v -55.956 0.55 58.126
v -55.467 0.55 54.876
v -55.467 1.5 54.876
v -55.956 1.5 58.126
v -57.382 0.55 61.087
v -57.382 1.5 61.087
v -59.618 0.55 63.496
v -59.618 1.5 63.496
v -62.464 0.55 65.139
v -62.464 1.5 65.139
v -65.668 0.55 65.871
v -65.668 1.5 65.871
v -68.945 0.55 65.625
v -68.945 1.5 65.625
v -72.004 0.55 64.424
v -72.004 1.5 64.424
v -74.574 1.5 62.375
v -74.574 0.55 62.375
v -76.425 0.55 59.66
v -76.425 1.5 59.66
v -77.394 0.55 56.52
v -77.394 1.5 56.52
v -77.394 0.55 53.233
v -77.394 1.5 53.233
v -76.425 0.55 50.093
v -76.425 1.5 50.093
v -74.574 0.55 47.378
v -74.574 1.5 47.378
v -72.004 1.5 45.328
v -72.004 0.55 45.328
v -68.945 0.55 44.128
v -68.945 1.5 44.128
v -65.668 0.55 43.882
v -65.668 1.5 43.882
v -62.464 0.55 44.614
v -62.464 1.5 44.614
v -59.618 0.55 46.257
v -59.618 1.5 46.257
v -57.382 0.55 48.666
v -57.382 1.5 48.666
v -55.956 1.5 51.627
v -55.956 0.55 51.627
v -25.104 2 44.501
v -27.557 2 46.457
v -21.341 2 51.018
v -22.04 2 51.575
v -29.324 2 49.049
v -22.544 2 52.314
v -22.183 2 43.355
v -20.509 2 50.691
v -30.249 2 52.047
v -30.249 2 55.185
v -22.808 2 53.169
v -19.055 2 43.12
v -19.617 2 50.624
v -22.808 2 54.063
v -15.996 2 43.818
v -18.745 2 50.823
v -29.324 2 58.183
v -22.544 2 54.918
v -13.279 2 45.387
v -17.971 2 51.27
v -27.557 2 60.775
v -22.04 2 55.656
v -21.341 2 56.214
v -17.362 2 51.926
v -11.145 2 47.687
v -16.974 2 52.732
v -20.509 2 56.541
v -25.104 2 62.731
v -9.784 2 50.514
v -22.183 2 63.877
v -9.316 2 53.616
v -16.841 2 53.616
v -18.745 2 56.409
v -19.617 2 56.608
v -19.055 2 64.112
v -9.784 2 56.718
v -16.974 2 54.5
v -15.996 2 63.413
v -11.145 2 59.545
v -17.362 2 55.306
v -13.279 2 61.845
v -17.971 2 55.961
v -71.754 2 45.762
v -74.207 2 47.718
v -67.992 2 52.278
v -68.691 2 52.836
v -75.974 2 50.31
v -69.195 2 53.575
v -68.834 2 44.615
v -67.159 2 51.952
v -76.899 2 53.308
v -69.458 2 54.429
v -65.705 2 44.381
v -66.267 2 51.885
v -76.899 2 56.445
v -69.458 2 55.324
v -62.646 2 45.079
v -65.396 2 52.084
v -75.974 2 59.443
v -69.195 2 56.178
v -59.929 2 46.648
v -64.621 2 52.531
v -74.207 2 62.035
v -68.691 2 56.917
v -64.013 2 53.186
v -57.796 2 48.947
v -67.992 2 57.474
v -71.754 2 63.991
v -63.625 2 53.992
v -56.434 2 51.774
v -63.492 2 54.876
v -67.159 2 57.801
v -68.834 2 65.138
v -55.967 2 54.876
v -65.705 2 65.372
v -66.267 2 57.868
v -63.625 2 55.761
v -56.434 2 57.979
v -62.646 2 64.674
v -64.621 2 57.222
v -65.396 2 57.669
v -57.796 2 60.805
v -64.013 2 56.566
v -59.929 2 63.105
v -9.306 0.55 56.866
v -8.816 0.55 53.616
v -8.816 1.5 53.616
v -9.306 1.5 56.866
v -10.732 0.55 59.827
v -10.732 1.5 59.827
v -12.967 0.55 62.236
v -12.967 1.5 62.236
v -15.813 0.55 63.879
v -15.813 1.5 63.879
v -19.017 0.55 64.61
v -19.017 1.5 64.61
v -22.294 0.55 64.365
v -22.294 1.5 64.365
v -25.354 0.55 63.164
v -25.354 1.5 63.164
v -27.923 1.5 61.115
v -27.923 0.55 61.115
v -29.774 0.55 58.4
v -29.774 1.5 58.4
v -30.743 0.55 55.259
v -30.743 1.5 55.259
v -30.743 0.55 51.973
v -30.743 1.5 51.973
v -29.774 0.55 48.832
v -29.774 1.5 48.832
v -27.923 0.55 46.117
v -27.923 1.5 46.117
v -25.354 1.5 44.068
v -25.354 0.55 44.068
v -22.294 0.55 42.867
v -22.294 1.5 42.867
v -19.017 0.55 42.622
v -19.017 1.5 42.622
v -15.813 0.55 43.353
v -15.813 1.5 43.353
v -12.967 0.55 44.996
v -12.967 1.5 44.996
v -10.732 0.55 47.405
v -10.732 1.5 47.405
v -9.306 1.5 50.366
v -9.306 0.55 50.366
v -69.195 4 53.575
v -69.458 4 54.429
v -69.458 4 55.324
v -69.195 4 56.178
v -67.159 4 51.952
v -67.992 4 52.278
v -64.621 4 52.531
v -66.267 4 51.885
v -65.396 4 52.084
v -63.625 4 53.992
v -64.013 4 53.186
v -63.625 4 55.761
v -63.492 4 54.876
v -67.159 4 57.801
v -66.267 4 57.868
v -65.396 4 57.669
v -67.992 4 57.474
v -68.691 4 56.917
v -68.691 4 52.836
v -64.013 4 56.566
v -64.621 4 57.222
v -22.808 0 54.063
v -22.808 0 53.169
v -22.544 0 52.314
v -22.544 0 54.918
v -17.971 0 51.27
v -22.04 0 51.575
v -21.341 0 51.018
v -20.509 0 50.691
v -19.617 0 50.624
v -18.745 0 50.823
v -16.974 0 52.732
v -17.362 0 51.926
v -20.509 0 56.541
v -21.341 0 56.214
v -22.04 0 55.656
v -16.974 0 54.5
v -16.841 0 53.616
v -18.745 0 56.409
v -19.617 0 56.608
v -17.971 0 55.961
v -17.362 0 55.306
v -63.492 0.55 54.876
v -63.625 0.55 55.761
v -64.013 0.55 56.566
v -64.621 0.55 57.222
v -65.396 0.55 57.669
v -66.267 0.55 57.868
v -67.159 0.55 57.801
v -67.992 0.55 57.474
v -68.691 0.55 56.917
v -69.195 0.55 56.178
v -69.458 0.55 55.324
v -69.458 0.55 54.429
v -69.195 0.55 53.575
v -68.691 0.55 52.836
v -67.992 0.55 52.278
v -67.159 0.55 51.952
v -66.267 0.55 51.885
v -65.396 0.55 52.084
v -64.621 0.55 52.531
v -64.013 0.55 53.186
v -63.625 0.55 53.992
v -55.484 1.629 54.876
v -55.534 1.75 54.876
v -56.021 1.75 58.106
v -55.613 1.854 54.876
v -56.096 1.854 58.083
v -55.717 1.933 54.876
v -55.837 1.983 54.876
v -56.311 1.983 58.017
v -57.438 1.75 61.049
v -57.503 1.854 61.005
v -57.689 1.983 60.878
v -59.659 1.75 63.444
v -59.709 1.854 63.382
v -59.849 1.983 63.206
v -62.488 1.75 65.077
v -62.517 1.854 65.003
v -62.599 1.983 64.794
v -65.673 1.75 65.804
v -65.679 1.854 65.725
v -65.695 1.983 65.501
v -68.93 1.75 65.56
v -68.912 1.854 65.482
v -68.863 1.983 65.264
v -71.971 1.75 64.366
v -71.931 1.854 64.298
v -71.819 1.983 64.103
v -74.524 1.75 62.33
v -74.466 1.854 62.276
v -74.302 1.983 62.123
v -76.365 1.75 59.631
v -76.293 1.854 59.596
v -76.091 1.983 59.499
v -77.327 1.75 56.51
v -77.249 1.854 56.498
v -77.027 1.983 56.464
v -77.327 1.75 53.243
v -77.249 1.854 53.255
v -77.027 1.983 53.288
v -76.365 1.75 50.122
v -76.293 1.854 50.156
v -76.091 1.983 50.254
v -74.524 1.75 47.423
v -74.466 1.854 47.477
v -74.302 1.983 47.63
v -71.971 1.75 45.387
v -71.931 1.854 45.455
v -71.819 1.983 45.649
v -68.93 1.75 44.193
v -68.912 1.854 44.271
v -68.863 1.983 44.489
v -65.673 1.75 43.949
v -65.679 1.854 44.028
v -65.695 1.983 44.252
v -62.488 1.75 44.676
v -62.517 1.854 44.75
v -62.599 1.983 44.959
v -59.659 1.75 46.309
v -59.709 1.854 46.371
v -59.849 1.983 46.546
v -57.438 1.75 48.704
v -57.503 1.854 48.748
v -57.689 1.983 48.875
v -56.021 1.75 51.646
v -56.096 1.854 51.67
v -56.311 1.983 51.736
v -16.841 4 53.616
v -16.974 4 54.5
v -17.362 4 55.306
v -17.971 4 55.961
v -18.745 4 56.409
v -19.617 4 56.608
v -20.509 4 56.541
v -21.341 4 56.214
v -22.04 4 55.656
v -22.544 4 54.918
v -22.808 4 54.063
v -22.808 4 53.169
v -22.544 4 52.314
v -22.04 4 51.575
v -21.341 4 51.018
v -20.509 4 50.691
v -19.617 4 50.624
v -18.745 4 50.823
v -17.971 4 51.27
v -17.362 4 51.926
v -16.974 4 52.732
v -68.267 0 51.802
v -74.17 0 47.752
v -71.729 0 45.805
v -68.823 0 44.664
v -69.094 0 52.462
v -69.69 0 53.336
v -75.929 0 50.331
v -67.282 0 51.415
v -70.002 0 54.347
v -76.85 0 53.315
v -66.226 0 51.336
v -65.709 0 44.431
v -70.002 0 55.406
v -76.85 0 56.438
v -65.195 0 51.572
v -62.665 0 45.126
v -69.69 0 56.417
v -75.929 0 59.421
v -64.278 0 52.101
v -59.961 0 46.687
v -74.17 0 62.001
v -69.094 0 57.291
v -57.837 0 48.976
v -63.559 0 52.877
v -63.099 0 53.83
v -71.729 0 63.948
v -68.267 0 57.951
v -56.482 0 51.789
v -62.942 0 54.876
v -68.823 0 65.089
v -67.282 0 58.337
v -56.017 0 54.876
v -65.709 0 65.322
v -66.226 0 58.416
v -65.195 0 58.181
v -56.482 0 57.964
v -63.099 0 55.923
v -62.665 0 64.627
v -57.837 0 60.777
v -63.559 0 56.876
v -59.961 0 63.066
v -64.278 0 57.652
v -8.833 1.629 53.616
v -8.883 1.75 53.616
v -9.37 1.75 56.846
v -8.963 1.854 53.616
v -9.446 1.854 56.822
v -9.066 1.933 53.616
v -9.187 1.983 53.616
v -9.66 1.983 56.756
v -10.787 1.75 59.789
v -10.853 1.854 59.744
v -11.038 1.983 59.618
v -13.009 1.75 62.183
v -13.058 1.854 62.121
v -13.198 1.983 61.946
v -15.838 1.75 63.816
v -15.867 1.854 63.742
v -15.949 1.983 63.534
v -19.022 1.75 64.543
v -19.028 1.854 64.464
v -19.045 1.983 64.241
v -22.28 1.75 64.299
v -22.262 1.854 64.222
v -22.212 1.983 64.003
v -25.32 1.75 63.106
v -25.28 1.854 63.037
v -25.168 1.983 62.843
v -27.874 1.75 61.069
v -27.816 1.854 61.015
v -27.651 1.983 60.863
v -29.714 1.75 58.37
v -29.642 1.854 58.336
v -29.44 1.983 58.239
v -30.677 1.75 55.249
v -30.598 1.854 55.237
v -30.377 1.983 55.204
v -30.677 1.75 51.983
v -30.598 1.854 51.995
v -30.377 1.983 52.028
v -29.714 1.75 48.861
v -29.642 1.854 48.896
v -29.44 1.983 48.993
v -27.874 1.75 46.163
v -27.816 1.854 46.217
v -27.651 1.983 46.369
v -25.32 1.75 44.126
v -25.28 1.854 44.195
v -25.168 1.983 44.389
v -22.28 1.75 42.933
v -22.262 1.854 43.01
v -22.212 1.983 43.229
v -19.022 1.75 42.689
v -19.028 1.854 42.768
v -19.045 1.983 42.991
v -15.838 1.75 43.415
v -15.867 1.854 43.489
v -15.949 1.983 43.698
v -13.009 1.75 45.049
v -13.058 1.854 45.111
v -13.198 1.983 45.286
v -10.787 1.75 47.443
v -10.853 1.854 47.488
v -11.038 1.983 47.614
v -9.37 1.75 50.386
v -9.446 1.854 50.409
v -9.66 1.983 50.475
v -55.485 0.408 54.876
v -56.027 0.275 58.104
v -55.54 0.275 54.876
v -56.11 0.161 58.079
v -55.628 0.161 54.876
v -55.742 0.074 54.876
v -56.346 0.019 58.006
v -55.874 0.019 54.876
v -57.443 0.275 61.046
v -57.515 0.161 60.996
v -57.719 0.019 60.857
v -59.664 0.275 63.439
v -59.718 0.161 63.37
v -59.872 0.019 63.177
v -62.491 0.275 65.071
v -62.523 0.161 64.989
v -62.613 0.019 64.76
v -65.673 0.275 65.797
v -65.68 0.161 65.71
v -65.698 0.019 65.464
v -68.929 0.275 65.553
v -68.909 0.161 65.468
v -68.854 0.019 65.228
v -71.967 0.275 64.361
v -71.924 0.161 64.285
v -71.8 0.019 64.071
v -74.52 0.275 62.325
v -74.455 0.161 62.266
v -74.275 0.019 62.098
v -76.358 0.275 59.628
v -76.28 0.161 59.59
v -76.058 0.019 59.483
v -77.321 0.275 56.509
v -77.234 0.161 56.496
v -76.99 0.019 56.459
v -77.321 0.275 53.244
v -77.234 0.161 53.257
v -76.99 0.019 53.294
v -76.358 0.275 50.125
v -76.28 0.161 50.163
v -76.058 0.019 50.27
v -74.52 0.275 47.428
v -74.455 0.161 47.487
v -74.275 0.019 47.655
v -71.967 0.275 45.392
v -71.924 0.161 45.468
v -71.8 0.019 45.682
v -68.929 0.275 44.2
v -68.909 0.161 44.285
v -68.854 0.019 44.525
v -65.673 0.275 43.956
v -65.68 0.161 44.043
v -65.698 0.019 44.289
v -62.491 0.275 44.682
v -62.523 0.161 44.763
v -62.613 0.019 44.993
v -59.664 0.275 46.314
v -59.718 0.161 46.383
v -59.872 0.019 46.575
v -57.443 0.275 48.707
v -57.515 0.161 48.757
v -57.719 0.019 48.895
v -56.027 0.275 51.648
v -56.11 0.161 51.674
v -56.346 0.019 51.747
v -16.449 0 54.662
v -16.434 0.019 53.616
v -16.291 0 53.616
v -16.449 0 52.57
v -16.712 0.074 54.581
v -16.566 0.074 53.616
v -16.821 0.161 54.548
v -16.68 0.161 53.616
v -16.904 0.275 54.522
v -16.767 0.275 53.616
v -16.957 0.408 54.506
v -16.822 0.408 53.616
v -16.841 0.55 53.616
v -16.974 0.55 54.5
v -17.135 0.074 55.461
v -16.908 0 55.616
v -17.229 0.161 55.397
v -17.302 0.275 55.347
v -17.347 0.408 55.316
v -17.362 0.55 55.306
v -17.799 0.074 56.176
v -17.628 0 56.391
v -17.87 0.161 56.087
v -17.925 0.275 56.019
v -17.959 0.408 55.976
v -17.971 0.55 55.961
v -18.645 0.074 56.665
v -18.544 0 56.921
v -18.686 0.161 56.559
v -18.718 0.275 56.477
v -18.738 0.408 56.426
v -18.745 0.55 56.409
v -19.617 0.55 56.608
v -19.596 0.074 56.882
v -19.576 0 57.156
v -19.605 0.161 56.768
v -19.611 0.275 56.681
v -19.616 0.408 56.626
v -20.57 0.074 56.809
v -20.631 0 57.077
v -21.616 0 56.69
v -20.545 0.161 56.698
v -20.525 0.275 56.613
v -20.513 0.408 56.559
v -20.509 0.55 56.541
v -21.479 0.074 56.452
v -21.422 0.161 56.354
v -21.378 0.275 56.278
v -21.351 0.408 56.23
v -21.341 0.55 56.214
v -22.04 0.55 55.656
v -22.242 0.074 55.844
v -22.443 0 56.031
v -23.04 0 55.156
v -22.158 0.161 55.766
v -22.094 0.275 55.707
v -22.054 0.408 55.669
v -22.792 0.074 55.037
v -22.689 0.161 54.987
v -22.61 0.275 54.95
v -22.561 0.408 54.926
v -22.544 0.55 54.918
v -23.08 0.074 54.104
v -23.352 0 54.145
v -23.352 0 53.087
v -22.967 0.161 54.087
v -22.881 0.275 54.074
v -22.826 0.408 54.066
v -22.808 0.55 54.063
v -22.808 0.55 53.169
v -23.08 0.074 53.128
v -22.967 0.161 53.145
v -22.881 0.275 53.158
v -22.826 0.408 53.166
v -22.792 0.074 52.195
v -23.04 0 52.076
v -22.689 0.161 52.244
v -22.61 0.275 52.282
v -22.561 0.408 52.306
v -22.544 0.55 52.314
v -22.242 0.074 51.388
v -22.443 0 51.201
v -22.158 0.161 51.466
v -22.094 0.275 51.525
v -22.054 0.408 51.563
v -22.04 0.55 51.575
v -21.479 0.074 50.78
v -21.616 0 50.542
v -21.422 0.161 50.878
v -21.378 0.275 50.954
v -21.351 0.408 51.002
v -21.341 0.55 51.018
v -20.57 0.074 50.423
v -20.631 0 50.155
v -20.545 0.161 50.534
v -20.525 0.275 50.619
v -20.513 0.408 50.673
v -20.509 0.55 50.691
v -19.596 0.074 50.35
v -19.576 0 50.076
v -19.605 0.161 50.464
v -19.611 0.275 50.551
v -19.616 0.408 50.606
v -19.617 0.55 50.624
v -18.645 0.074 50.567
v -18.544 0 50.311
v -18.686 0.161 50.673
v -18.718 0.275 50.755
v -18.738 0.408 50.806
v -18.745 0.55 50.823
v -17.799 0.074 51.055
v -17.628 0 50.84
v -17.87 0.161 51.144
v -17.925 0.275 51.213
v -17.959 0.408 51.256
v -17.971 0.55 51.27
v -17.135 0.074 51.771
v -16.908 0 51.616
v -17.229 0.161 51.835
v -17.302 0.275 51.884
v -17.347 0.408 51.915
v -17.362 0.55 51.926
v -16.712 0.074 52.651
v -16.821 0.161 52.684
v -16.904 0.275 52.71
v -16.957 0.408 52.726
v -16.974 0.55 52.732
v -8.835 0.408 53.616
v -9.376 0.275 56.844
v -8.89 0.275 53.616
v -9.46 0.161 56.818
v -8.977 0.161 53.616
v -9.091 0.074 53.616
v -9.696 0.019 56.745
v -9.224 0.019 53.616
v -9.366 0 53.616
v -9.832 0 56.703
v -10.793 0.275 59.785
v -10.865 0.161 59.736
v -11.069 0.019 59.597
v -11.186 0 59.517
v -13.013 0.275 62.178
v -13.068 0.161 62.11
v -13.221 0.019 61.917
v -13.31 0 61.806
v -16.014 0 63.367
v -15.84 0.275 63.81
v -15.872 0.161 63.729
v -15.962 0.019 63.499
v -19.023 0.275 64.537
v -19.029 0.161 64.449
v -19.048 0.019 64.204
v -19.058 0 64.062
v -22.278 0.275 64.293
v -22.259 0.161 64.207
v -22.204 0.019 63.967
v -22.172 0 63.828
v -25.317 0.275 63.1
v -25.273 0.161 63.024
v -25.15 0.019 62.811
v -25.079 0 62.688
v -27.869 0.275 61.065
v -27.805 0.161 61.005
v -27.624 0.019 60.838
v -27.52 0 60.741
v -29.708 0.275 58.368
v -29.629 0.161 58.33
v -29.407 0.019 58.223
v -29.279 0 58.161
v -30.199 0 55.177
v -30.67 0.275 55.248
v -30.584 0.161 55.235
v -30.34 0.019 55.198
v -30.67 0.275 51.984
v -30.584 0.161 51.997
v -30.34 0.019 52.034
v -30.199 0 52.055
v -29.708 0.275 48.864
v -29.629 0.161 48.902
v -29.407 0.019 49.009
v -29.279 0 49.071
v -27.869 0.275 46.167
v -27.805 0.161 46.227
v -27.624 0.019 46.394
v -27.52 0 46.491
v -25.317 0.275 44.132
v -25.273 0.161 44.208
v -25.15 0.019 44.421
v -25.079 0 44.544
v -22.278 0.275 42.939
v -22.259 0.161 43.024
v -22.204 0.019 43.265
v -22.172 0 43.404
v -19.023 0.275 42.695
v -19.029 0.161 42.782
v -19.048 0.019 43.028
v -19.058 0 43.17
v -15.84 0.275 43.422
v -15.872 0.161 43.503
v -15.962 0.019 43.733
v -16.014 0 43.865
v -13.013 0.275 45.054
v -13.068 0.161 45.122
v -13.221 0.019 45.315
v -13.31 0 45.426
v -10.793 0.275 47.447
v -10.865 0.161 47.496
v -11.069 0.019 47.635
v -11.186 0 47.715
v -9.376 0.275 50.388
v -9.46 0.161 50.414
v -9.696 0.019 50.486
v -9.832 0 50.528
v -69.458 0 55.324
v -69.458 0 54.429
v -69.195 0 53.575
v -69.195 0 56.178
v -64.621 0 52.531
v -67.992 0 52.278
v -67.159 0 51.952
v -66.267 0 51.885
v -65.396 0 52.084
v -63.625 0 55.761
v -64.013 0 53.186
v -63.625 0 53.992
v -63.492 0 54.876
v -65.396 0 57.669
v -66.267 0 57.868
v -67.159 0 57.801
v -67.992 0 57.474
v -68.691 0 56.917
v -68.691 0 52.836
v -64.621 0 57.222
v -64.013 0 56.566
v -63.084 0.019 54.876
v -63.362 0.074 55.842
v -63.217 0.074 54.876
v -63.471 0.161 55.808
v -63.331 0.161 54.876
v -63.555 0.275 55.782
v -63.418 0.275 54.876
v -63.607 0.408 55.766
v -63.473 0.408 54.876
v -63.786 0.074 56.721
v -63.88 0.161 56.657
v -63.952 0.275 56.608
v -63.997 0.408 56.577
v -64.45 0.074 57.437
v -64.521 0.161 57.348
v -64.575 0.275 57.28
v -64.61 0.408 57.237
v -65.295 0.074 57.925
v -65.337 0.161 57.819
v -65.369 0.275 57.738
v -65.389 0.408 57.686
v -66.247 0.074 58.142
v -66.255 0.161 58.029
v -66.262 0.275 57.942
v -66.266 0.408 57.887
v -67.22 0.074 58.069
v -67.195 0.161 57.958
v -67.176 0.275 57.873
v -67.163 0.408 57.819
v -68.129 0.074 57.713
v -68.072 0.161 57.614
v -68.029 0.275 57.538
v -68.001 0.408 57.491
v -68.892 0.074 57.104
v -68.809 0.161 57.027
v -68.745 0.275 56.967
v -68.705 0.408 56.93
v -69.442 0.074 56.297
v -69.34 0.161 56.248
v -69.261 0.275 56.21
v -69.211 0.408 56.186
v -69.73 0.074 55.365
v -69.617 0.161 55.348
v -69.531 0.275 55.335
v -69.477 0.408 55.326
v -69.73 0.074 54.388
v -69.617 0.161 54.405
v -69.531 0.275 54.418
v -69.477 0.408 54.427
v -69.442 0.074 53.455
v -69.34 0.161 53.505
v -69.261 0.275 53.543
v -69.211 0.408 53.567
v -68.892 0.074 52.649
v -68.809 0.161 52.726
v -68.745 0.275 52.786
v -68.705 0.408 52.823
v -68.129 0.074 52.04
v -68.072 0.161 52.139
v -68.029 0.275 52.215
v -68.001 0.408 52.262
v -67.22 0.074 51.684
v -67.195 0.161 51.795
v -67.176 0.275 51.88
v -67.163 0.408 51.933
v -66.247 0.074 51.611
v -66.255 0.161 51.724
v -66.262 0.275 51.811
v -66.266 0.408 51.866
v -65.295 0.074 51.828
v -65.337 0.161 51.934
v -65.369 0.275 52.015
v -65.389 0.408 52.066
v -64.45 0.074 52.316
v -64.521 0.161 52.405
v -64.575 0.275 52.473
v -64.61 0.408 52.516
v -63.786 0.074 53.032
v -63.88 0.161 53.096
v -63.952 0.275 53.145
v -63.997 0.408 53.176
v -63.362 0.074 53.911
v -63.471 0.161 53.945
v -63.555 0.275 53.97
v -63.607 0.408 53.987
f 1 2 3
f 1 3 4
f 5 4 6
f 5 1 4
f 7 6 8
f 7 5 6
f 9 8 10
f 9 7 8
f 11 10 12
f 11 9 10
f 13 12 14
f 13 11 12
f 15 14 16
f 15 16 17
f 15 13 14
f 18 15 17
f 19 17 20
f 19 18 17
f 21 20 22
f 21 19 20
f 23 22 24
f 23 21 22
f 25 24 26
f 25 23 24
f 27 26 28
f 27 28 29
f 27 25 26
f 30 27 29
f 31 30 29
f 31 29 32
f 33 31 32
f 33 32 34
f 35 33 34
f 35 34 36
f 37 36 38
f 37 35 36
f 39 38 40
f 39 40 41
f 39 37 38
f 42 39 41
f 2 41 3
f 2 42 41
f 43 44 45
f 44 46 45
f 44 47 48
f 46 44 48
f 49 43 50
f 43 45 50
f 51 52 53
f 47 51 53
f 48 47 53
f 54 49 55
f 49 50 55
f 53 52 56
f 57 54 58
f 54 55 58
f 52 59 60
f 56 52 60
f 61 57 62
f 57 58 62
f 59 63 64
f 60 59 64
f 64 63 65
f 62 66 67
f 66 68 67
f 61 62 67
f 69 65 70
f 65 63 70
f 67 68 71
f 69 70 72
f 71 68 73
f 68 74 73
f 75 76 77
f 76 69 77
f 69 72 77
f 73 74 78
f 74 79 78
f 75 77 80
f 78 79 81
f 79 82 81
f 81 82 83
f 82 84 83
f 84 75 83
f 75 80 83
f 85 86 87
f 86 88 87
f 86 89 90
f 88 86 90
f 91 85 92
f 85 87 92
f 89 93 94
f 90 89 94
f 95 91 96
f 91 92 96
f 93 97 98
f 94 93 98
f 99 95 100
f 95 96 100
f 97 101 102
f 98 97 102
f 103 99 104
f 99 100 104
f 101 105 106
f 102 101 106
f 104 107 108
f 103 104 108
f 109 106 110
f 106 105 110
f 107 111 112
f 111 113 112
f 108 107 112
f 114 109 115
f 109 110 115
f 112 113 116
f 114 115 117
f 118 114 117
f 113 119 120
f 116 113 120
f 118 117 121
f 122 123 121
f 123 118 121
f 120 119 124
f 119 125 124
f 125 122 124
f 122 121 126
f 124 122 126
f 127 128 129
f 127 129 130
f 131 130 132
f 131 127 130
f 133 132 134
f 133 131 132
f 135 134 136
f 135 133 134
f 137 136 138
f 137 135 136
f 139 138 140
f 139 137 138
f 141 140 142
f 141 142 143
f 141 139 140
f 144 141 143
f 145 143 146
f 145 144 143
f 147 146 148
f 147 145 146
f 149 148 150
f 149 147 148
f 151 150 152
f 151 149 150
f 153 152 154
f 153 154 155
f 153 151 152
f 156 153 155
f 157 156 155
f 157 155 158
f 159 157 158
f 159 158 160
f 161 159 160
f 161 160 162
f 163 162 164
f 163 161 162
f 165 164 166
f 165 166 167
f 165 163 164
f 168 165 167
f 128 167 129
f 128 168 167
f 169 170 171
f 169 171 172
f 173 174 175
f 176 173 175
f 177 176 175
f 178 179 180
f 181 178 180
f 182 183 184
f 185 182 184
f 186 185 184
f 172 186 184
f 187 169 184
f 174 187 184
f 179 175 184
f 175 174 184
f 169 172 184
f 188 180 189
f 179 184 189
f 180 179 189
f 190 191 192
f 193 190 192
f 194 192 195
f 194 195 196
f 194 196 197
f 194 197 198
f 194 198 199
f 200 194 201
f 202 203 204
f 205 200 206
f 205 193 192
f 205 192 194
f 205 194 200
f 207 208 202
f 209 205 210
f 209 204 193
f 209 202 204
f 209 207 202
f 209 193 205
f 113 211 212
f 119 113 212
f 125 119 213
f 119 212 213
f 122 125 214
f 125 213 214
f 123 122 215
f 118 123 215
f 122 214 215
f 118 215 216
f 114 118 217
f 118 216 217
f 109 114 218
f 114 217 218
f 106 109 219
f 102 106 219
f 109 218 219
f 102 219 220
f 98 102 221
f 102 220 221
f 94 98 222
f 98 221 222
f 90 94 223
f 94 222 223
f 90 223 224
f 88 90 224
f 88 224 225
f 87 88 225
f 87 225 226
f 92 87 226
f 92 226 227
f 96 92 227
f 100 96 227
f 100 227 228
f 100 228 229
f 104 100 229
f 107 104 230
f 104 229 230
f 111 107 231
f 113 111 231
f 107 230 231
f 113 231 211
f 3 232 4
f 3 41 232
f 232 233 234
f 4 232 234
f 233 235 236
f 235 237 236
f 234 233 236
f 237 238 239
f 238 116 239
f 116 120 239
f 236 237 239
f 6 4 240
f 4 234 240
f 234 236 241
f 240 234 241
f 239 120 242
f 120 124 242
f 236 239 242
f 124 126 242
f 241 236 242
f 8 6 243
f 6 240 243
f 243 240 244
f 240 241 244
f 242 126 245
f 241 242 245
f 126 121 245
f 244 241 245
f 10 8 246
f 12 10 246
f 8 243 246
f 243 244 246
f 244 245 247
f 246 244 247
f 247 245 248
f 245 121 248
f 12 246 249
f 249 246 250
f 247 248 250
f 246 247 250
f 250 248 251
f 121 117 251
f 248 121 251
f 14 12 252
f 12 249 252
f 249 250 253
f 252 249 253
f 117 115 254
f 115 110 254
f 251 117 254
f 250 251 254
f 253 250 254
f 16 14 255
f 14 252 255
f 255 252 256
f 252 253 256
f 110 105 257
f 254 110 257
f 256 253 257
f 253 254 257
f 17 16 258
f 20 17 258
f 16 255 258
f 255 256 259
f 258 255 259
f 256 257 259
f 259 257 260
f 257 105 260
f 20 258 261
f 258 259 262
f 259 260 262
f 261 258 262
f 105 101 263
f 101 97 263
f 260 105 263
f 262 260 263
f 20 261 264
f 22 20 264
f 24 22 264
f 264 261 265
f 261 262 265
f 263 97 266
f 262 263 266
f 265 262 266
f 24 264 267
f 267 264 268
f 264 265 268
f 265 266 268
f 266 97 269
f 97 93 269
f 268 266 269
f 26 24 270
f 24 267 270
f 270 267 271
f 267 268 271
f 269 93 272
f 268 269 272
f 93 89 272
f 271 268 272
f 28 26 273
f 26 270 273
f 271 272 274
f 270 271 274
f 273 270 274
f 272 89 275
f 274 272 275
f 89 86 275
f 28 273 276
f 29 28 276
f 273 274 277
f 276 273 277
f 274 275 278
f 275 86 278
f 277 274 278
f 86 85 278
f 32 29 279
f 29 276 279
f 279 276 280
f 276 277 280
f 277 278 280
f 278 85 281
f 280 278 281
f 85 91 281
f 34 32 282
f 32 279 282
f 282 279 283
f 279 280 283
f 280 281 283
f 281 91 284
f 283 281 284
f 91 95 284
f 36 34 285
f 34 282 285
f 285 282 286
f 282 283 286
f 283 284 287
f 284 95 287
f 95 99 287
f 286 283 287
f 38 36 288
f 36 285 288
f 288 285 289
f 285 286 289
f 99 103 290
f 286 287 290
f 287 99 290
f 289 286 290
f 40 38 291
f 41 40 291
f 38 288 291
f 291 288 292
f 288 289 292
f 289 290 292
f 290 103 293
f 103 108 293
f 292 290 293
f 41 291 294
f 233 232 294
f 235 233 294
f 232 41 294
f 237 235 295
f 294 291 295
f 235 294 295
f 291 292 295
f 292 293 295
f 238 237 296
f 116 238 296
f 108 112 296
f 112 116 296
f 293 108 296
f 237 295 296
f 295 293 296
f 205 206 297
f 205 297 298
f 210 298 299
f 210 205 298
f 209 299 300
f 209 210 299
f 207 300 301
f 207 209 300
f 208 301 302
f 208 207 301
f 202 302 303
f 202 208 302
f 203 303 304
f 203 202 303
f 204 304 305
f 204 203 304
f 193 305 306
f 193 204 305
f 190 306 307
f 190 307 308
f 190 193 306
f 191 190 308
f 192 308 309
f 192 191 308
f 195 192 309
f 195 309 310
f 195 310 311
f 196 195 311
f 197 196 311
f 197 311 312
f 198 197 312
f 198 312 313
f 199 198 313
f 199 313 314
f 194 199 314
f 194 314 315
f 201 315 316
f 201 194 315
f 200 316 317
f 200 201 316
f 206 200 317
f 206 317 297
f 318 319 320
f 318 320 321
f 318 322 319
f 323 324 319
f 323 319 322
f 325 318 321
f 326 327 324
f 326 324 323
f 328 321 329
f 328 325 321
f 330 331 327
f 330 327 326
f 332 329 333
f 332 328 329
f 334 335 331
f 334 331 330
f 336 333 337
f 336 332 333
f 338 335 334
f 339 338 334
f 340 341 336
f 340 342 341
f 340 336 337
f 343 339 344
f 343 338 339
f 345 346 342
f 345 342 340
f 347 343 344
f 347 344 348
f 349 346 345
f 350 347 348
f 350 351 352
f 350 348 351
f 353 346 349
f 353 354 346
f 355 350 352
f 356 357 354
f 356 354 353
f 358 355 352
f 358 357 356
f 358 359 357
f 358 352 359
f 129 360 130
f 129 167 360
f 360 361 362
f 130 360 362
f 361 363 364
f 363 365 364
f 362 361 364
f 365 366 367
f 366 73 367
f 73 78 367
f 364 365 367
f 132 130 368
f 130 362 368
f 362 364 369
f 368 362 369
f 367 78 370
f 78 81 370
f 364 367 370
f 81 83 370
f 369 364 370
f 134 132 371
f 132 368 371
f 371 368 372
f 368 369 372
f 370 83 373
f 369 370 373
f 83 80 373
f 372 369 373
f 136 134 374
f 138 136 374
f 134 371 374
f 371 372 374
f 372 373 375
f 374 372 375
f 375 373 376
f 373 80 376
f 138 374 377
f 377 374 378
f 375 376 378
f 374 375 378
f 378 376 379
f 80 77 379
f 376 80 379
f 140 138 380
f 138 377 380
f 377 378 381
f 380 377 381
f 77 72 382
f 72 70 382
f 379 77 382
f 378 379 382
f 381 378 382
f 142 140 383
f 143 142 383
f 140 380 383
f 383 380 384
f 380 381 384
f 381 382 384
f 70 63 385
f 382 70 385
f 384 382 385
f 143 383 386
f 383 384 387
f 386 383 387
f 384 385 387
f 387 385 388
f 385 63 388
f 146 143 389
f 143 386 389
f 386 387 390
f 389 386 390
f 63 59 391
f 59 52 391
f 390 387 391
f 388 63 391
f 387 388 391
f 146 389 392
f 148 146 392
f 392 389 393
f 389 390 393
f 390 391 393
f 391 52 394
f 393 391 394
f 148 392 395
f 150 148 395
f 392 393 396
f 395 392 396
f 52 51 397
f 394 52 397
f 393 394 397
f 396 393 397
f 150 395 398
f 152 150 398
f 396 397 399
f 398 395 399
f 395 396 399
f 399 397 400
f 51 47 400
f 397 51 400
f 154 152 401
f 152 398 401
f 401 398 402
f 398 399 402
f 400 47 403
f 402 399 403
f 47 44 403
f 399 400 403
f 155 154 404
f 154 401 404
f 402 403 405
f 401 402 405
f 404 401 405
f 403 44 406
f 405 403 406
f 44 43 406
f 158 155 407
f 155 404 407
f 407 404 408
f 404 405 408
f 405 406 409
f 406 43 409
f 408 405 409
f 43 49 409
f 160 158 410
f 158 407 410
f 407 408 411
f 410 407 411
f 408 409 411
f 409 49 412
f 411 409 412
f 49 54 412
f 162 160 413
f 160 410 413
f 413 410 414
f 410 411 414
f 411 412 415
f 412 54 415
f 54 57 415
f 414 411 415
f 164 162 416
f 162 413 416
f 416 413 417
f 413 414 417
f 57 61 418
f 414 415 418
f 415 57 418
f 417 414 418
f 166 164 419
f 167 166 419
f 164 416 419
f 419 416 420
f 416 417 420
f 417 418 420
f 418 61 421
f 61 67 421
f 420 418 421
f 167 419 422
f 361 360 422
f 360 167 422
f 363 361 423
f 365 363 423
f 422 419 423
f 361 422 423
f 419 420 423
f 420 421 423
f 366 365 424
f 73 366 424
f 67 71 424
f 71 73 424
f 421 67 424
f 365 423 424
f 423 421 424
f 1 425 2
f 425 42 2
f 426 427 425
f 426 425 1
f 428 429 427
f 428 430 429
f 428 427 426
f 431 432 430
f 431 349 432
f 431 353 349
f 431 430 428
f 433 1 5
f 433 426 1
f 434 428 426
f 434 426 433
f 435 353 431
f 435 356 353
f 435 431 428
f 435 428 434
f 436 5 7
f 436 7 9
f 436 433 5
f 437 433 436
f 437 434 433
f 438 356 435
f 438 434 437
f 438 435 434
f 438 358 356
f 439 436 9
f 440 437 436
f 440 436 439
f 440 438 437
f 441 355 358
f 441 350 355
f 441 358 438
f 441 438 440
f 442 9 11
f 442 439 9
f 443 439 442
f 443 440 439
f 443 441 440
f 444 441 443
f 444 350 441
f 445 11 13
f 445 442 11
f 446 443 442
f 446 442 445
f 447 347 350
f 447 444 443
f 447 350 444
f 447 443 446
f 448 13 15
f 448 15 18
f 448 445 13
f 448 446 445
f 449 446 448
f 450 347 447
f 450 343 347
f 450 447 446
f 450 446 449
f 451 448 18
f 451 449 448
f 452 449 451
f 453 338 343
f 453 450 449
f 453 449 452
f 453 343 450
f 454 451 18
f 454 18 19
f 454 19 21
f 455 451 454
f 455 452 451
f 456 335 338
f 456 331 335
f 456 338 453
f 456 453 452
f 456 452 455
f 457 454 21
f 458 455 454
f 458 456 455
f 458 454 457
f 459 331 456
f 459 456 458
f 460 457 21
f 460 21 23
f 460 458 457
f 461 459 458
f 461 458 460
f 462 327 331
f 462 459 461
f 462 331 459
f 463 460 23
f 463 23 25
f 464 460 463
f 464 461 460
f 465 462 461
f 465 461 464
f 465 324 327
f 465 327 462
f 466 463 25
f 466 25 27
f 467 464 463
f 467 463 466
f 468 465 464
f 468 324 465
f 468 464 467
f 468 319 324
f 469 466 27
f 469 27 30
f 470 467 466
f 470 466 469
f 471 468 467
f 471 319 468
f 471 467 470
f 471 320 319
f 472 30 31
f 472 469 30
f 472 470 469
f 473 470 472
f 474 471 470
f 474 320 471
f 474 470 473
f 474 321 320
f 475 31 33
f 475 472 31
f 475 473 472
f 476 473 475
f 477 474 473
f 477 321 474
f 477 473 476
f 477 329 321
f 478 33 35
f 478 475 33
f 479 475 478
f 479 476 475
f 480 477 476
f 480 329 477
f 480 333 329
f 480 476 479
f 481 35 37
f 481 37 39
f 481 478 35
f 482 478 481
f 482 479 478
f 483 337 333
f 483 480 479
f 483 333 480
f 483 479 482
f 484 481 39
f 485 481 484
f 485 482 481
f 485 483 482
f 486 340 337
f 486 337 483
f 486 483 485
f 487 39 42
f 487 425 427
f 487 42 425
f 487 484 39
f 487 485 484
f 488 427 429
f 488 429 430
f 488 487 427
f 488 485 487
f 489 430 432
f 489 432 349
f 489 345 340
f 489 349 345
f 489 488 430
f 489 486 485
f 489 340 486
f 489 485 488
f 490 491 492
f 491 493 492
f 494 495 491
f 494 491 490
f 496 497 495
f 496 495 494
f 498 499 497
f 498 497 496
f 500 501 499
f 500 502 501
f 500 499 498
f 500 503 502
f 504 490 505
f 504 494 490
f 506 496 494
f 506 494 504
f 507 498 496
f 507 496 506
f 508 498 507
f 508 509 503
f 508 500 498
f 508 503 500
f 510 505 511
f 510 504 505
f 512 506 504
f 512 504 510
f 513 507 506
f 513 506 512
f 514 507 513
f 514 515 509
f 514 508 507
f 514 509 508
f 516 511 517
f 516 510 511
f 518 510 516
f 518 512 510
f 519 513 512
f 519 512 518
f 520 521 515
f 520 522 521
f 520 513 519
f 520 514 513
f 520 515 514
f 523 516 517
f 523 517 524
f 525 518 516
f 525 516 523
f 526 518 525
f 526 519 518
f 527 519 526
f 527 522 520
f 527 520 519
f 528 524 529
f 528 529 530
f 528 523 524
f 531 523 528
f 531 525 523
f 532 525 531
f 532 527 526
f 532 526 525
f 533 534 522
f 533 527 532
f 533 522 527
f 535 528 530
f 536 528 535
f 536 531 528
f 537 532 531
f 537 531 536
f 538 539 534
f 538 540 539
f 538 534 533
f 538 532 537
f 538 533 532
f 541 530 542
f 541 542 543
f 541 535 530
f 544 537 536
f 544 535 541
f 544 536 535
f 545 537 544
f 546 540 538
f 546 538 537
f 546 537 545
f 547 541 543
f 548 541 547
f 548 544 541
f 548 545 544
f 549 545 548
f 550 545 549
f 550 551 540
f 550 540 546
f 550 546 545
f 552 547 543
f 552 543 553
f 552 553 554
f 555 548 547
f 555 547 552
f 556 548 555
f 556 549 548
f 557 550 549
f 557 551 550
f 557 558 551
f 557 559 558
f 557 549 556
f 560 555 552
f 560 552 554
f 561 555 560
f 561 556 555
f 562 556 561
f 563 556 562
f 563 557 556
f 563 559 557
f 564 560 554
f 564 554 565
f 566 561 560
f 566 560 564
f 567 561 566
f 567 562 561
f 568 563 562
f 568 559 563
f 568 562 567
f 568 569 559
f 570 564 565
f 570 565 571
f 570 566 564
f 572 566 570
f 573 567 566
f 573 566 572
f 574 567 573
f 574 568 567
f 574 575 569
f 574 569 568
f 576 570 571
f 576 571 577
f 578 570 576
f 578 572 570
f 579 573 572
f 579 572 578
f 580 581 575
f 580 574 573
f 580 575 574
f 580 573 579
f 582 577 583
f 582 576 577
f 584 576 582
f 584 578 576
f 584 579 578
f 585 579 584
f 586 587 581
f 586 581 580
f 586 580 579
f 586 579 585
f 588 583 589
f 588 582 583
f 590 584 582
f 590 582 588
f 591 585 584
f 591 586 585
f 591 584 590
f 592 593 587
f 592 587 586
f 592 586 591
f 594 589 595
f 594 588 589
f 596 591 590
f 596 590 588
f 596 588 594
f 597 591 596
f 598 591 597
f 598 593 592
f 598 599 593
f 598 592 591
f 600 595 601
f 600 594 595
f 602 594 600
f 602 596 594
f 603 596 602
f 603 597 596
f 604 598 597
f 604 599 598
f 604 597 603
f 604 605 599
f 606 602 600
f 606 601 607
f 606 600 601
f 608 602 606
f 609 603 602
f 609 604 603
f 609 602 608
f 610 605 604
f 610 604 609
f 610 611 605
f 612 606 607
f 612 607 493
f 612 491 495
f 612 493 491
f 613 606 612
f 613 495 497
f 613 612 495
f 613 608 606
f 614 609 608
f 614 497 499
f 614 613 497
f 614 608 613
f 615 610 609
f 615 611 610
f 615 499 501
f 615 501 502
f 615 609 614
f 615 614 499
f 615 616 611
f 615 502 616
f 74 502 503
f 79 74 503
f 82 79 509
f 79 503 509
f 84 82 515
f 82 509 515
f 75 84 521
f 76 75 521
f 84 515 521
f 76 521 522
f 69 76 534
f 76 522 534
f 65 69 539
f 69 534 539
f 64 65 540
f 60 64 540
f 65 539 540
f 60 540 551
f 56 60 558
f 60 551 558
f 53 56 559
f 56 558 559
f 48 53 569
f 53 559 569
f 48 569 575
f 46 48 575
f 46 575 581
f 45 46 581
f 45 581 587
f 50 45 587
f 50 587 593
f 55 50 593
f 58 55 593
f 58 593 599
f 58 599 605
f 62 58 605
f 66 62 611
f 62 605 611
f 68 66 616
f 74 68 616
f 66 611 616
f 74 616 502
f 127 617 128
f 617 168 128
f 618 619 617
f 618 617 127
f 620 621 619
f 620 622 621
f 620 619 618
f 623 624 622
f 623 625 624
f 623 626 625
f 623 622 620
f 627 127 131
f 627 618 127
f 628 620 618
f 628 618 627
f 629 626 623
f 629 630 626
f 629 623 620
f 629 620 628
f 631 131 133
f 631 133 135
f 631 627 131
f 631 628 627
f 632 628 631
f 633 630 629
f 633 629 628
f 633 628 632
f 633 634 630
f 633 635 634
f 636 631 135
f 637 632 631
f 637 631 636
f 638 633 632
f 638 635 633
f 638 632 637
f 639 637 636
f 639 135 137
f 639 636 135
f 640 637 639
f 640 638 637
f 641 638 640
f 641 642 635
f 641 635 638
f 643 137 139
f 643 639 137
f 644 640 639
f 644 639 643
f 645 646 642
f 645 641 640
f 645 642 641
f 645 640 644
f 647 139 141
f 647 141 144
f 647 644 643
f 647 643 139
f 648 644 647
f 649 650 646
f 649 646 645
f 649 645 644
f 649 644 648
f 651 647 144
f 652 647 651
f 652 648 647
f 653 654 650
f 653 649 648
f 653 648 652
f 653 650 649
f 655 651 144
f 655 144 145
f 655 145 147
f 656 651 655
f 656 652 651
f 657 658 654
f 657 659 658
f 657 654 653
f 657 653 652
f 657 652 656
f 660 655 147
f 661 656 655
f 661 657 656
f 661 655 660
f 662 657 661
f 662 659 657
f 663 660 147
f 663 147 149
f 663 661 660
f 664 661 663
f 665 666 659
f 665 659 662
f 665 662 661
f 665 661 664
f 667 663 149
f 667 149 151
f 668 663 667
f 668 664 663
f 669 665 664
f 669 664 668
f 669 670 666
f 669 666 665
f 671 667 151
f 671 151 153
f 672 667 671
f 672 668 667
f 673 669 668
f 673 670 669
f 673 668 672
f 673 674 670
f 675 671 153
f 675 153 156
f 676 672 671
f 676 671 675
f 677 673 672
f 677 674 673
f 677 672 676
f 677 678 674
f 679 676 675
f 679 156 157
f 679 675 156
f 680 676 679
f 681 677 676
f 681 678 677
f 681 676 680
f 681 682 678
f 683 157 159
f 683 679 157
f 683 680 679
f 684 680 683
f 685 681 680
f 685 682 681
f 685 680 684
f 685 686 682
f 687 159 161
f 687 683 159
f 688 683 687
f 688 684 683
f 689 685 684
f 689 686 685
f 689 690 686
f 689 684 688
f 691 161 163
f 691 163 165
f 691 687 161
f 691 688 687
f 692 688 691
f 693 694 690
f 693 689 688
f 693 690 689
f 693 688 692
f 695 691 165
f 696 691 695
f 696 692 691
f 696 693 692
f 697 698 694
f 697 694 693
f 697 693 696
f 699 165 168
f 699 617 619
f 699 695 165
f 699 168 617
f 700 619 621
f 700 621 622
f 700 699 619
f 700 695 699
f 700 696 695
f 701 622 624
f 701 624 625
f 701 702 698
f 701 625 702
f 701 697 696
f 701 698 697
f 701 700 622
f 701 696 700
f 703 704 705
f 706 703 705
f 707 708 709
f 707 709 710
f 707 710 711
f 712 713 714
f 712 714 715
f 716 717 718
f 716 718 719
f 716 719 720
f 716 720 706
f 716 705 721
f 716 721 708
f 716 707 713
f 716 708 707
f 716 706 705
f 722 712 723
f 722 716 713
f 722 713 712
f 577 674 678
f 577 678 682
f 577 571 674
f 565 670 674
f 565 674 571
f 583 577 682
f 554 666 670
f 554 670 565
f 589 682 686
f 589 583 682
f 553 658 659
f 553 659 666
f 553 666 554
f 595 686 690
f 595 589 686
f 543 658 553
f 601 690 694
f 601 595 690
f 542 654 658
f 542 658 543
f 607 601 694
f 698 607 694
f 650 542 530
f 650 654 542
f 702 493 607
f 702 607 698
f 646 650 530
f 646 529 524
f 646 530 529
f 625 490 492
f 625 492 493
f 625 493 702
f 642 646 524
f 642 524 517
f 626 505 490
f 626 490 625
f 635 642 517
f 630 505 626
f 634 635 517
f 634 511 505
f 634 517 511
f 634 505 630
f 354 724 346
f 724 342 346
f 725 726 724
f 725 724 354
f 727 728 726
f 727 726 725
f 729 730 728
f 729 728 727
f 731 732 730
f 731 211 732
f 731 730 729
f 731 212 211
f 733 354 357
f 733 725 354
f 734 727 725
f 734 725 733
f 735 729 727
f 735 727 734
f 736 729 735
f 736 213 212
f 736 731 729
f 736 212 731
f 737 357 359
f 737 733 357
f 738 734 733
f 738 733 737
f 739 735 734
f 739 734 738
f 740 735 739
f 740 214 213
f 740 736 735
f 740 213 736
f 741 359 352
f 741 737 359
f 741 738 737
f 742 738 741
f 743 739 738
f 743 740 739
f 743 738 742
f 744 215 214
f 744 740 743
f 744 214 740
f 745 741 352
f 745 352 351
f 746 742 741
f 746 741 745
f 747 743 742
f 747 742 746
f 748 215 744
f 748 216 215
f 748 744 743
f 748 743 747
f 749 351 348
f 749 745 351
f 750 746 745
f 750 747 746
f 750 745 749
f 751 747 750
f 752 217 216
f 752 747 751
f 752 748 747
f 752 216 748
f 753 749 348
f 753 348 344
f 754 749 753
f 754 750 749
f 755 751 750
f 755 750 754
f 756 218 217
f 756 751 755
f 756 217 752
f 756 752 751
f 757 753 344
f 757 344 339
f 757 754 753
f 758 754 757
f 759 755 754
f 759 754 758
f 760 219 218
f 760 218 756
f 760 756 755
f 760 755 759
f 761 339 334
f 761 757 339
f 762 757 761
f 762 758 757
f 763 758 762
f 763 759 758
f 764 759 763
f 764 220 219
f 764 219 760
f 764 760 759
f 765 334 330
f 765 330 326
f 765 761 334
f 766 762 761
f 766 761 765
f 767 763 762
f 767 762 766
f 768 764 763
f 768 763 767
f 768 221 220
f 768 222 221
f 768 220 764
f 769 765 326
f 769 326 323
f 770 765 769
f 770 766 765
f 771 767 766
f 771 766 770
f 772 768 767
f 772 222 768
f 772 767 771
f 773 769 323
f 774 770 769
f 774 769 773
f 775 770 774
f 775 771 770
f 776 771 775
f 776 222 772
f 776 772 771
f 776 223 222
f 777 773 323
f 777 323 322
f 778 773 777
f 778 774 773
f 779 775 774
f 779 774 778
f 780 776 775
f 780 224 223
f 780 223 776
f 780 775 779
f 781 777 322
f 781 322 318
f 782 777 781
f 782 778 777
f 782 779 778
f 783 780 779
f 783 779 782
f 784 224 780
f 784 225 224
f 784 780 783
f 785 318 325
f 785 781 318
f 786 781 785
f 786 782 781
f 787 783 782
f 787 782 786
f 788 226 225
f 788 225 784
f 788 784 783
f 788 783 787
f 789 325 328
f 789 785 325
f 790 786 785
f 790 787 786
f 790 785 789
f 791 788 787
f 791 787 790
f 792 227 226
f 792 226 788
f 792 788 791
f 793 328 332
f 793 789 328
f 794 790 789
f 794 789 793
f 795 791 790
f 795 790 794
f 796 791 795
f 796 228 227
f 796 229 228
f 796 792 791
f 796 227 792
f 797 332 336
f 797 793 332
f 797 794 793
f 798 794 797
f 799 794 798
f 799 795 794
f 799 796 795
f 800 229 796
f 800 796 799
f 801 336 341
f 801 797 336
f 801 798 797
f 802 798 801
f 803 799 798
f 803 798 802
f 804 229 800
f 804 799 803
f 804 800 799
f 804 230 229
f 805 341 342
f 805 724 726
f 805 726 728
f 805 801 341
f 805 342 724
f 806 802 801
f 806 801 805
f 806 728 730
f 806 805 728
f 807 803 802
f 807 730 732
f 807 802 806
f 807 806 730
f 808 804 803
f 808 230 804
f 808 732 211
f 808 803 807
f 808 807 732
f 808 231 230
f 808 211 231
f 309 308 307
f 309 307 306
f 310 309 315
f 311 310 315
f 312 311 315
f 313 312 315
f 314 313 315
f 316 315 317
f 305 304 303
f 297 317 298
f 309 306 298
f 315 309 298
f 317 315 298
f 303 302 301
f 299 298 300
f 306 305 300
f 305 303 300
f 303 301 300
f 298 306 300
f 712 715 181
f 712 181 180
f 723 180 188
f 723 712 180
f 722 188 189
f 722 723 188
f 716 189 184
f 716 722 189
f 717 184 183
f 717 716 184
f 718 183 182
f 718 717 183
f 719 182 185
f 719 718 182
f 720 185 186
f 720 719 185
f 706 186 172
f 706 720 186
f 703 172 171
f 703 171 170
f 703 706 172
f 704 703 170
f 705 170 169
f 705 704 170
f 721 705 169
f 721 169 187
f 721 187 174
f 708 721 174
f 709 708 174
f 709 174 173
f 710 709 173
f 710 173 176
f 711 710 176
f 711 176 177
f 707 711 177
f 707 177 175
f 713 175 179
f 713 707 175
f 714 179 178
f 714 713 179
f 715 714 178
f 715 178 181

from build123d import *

# Parameters (mm, degrees)
F0_R     = 11.025
F0_R_2   = 3
F1_DEPTH = 2
F2_R     = 0.5
F3_DEPTH = 4
F4_R     = 0.55


with BuildPart() as f1:
    # F0 (on Front) → F1 (new body)
    with BuildSketch(Plane.XZ):
        with Locations((-19.84116, 53.615939)):
            Circle(F0_R)
        with Locations((-19.84116, 53.615939)):
            Circle(F0_R_2, mode=Mode.SUBTRACT)
        with Locations((-66.491679, 54.876422)):
            Circle(F0_R)
        with Locations((-66.491679, 54.876422)):
            Circle(F0_R_2, mode=Mode.SUBTRACT)
    extrude(amount=-F1_DEPTH)

    # F2
    f2_edges = [f1.edges().sort_by_distance(p)[0] for p in [
        (-30.86616, 2, 53.615939),
        (-77.516679, 2, 54.876422),
    ]]
    fillet(f2_edges, radius=F2_R)

    # F4
    f4_edges = [f1.edges().sort_by_distance(p)[0] for p in [
        (-77.516679, 0, 54.876422),
        (-69.491679, 0, 54.876422),
        (-30.86616, 0, 53.615939),
        (-22.84116, 0, 53.615939),
    ]]
    fillet(f4_edges, radius=F4_R)


with BuildPart() as f3:
    # F0 (on Front) → F3 (new body)
    with BuildSketch(Plane.XZ):
        with Locations((-66.491679, 54.876422)):
            Circle(F0_R_2)
        with Locations((-19.84116, 53.615939)):
            Circle(F0_R_2)
    extrude(amount=-F3_DEPTH)


solid = Compound([f1.part, f3.part])
